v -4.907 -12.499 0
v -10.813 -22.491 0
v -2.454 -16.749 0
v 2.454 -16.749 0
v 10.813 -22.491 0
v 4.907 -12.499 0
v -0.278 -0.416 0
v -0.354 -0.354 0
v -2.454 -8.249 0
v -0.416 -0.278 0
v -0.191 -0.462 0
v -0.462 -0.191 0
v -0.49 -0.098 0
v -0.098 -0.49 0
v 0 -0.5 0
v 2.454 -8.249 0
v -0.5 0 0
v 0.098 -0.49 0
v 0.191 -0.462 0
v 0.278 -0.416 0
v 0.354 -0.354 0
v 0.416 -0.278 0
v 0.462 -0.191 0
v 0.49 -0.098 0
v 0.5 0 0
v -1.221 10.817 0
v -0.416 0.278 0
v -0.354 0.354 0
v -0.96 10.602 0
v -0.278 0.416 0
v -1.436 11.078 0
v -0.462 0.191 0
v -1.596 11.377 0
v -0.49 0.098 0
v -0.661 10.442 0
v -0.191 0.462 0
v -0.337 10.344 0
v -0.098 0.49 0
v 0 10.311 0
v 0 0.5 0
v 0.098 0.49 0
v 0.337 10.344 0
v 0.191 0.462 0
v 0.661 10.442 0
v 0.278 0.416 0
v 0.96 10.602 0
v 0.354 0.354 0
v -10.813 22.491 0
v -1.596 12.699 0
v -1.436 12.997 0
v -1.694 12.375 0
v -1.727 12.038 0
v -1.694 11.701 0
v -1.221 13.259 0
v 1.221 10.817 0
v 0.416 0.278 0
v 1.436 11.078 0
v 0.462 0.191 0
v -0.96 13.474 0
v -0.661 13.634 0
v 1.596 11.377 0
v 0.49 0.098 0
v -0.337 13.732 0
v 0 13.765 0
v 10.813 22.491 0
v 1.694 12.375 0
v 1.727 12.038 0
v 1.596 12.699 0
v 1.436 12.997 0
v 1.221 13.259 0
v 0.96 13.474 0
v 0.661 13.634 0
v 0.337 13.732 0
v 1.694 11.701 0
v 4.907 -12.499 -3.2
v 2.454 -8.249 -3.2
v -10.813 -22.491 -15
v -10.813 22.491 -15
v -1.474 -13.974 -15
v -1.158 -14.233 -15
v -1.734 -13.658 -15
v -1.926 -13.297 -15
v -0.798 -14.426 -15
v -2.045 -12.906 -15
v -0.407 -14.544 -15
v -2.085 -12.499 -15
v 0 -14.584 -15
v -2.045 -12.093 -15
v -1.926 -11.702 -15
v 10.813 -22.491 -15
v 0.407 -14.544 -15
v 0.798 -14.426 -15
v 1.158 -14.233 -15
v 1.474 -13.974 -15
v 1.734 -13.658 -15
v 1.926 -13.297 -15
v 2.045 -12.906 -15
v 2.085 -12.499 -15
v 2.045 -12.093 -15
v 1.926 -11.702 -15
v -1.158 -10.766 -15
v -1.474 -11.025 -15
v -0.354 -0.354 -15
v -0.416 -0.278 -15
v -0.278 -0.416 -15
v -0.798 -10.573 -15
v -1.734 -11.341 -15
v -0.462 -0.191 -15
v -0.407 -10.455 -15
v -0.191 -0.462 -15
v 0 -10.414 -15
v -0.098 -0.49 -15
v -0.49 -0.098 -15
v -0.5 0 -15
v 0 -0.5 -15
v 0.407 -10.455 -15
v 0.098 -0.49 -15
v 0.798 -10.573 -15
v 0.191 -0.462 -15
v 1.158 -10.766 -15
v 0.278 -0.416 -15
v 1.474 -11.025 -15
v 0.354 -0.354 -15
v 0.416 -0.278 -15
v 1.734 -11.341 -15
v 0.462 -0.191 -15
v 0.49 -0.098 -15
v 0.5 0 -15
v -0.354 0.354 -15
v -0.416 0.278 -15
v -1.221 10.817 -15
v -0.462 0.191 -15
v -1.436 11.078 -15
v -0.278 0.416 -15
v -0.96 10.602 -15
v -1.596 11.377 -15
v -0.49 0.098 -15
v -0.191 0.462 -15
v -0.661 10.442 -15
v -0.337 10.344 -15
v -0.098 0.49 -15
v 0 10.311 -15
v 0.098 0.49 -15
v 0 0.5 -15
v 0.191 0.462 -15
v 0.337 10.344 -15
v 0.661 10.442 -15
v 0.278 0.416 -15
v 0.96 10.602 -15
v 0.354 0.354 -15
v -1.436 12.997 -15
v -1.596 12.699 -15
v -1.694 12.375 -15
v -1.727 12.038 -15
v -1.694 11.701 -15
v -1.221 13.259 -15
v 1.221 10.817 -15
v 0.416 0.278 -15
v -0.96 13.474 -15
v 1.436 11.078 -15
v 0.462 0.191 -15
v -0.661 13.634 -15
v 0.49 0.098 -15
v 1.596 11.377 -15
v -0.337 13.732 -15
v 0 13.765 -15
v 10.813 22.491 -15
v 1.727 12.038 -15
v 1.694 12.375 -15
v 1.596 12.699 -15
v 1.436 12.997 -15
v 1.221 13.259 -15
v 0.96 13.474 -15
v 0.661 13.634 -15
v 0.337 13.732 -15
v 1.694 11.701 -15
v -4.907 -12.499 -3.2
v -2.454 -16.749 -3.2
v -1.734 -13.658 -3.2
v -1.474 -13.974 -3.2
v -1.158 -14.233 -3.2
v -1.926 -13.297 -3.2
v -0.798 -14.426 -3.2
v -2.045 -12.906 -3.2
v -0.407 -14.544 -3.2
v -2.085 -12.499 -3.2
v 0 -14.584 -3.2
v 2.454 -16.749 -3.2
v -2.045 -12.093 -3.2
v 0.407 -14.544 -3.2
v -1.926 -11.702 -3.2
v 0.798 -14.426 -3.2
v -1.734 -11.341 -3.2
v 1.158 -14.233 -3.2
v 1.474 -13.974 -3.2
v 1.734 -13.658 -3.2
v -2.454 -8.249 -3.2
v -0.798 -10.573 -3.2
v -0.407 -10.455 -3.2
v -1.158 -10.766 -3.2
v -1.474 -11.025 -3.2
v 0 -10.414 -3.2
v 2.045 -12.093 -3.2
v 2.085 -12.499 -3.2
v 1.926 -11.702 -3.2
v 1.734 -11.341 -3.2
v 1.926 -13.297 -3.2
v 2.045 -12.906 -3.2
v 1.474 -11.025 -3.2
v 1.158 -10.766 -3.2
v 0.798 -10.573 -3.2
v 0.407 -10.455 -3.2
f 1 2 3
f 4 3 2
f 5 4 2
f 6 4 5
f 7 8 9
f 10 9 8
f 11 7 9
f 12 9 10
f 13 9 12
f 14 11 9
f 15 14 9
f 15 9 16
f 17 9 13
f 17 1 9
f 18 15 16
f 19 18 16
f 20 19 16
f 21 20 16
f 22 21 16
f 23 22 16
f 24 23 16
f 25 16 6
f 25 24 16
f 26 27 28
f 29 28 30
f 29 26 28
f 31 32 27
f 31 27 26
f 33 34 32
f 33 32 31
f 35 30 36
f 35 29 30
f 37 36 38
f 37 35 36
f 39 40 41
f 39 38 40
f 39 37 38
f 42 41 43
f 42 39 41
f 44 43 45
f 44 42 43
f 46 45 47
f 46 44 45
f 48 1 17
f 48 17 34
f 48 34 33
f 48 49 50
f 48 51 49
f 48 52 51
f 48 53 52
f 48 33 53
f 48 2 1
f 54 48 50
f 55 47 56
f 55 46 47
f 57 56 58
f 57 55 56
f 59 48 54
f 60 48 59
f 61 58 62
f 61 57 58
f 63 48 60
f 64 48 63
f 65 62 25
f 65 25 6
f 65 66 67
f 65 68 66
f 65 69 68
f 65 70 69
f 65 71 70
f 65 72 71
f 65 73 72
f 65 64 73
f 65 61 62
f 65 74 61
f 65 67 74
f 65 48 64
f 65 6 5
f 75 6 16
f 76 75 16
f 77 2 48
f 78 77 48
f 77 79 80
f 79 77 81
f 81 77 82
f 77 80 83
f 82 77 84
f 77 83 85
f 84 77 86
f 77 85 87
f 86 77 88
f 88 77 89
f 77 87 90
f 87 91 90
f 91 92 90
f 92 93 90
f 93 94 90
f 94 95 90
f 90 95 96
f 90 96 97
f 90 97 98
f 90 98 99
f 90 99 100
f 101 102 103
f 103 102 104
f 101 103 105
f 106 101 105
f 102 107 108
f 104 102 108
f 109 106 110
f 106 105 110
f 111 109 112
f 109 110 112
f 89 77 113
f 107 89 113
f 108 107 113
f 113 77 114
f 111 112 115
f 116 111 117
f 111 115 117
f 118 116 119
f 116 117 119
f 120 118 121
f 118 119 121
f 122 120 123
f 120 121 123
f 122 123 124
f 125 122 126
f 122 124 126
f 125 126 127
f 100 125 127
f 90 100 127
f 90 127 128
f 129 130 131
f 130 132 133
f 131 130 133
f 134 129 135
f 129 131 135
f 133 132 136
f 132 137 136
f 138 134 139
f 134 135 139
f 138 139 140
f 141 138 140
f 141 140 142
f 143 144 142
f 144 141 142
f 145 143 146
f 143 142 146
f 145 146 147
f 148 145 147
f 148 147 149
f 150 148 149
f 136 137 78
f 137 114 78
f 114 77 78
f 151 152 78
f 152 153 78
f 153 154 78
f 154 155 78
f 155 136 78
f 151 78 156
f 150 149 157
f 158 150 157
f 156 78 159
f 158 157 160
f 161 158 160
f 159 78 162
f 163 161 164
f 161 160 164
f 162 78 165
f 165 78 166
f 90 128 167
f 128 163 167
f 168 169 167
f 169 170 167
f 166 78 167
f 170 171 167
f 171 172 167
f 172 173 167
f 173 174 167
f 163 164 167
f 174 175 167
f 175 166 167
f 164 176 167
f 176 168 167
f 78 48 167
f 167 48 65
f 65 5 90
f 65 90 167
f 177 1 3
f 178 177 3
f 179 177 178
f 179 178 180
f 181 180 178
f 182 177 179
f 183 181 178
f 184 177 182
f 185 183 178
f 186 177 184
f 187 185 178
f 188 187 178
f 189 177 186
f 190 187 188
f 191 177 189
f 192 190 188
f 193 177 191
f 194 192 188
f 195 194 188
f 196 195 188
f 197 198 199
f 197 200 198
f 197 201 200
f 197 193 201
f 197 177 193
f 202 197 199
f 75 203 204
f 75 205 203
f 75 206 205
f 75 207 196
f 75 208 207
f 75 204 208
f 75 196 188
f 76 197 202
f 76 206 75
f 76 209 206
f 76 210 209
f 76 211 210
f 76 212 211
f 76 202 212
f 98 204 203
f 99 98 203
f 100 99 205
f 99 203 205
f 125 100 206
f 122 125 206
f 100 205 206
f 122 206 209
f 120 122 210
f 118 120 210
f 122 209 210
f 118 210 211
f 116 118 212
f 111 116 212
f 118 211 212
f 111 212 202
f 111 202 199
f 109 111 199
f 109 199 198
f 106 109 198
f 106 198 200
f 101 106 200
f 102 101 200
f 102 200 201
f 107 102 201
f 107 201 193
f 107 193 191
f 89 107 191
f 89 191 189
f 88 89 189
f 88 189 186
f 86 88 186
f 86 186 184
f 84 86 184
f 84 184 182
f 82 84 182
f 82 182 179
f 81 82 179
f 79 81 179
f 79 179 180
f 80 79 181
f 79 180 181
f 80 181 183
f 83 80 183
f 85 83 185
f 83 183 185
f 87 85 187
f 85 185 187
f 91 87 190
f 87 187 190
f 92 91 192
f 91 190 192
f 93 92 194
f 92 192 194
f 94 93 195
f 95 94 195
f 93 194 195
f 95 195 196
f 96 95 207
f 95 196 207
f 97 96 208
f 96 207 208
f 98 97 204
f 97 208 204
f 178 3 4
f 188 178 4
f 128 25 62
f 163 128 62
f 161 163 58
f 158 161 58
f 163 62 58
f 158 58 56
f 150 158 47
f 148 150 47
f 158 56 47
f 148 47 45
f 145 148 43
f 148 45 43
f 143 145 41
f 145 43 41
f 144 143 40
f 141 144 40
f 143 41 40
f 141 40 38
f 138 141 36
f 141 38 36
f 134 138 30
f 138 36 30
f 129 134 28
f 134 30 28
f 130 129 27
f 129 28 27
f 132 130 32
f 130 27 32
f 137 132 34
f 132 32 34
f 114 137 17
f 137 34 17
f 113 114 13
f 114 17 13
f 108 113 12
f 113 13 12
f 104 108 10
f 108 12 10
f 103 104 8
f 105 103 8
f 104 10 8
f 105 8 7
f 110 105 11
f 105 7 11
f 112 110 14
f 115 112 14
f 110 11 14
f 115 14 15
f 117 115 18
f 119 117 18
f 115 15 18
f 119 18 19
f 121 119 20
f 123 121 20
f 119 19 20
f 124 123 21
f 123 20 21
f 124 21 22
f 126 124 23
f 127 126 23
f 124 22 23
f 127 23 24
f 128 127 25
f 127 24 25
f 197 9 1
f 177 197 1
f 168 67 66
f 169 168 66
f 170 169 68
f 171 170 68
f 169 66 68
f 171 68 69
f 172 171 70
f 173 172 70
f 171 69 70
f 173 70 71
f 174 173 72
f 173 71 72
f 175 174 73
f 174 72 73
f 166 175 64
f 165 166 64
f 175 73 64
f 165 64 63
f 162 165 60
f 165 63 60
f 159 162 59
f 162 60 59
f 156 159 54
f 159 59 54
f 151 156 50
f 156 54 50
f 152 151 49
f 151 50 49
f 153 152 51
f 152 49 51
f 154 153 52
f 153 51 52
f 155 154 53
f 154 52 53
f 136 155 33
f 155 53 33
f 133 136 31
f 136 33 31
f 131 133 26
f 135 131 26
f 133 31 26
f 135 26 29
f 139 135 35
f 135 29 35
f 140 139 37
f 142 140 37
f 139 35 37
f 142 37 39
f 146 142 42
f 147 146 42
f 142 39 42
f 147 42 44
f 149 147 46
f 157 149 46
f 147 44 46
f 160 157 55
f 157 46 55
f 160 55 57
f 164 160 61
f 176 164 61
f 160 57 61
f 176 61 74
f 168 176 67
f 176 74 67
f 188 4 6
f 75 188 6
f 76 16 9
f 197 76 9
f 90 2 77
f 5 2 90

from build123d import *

# Parameters (mm, degrees)
F0_W     = 21.6265451163
F0_H     = 44.9824891984
F0_R     = 0.5
F0_R_2   = 1.7272
F0_R_3   = 2.085
F1_DEPTH = 15
F2_DEPTH = 3.2


# Not quite as in the source:
# - a feature names something its author has since deleted; it is built from what else it names


with BuildPart() as f1:
    # F0 (on Top) → F1 (new body)
    with BuildSketch(Plane.XY):
        Rectangle(F0_W, F0_H)
        Polygon((-4.9074772881, -12.4994842336), (-2.4537386441, -8.2494842336), (2.4537386441, -8.2494842336), (4.9074772881, -12.4994842336), (2.4537386441, -16.7494842336), (-2.4537386441, -16.7494842336), align=None, mode=Mode.SUBTRACT)
        Circle(F0_R, mode=Mode.SUBTRACT)
        with Locations((0, 12.0378434658)):
            Circle(F0_R_2, mode=Mode.SUBTRACT)
        Polygon((2.4537386441, -8.2494842336), (-2.4537386441, -8.2494842336), (-4.9074772881, -12.4994842336), (-2.4537386441, -16.7494842336), (2.4537386441, -16.7494842336), (4.9074772881, -12.4994842336), align=None)
        with Locations((0, -12.4994842336)):
            Circle(F0_R_3, mode=Mode.SUBTRACT)
    extrude(amount=-F1_DEPTH)

    # F0 (on Top) → F2 (cut)
    with BuildSketch(Plane.XY):
        Polygon((2.4537386441, -8.2494842336), (-2.4537386441, -8.2494842336), (-4.9074772881, -12.4994842336), (-2.4537386441, -16.7494842336), (2.4537386441, -16.7494842336), (4.9074772881, -12.4994842336), align=None)
        with Locations((0, -12.4994842336)):
            Circle(F0_R_3, mode=Mode.SUBTRACT)
    extrude(amount=-F2_DEPTH, mode=Mode.SUBTRACT)


solid = f1.part
